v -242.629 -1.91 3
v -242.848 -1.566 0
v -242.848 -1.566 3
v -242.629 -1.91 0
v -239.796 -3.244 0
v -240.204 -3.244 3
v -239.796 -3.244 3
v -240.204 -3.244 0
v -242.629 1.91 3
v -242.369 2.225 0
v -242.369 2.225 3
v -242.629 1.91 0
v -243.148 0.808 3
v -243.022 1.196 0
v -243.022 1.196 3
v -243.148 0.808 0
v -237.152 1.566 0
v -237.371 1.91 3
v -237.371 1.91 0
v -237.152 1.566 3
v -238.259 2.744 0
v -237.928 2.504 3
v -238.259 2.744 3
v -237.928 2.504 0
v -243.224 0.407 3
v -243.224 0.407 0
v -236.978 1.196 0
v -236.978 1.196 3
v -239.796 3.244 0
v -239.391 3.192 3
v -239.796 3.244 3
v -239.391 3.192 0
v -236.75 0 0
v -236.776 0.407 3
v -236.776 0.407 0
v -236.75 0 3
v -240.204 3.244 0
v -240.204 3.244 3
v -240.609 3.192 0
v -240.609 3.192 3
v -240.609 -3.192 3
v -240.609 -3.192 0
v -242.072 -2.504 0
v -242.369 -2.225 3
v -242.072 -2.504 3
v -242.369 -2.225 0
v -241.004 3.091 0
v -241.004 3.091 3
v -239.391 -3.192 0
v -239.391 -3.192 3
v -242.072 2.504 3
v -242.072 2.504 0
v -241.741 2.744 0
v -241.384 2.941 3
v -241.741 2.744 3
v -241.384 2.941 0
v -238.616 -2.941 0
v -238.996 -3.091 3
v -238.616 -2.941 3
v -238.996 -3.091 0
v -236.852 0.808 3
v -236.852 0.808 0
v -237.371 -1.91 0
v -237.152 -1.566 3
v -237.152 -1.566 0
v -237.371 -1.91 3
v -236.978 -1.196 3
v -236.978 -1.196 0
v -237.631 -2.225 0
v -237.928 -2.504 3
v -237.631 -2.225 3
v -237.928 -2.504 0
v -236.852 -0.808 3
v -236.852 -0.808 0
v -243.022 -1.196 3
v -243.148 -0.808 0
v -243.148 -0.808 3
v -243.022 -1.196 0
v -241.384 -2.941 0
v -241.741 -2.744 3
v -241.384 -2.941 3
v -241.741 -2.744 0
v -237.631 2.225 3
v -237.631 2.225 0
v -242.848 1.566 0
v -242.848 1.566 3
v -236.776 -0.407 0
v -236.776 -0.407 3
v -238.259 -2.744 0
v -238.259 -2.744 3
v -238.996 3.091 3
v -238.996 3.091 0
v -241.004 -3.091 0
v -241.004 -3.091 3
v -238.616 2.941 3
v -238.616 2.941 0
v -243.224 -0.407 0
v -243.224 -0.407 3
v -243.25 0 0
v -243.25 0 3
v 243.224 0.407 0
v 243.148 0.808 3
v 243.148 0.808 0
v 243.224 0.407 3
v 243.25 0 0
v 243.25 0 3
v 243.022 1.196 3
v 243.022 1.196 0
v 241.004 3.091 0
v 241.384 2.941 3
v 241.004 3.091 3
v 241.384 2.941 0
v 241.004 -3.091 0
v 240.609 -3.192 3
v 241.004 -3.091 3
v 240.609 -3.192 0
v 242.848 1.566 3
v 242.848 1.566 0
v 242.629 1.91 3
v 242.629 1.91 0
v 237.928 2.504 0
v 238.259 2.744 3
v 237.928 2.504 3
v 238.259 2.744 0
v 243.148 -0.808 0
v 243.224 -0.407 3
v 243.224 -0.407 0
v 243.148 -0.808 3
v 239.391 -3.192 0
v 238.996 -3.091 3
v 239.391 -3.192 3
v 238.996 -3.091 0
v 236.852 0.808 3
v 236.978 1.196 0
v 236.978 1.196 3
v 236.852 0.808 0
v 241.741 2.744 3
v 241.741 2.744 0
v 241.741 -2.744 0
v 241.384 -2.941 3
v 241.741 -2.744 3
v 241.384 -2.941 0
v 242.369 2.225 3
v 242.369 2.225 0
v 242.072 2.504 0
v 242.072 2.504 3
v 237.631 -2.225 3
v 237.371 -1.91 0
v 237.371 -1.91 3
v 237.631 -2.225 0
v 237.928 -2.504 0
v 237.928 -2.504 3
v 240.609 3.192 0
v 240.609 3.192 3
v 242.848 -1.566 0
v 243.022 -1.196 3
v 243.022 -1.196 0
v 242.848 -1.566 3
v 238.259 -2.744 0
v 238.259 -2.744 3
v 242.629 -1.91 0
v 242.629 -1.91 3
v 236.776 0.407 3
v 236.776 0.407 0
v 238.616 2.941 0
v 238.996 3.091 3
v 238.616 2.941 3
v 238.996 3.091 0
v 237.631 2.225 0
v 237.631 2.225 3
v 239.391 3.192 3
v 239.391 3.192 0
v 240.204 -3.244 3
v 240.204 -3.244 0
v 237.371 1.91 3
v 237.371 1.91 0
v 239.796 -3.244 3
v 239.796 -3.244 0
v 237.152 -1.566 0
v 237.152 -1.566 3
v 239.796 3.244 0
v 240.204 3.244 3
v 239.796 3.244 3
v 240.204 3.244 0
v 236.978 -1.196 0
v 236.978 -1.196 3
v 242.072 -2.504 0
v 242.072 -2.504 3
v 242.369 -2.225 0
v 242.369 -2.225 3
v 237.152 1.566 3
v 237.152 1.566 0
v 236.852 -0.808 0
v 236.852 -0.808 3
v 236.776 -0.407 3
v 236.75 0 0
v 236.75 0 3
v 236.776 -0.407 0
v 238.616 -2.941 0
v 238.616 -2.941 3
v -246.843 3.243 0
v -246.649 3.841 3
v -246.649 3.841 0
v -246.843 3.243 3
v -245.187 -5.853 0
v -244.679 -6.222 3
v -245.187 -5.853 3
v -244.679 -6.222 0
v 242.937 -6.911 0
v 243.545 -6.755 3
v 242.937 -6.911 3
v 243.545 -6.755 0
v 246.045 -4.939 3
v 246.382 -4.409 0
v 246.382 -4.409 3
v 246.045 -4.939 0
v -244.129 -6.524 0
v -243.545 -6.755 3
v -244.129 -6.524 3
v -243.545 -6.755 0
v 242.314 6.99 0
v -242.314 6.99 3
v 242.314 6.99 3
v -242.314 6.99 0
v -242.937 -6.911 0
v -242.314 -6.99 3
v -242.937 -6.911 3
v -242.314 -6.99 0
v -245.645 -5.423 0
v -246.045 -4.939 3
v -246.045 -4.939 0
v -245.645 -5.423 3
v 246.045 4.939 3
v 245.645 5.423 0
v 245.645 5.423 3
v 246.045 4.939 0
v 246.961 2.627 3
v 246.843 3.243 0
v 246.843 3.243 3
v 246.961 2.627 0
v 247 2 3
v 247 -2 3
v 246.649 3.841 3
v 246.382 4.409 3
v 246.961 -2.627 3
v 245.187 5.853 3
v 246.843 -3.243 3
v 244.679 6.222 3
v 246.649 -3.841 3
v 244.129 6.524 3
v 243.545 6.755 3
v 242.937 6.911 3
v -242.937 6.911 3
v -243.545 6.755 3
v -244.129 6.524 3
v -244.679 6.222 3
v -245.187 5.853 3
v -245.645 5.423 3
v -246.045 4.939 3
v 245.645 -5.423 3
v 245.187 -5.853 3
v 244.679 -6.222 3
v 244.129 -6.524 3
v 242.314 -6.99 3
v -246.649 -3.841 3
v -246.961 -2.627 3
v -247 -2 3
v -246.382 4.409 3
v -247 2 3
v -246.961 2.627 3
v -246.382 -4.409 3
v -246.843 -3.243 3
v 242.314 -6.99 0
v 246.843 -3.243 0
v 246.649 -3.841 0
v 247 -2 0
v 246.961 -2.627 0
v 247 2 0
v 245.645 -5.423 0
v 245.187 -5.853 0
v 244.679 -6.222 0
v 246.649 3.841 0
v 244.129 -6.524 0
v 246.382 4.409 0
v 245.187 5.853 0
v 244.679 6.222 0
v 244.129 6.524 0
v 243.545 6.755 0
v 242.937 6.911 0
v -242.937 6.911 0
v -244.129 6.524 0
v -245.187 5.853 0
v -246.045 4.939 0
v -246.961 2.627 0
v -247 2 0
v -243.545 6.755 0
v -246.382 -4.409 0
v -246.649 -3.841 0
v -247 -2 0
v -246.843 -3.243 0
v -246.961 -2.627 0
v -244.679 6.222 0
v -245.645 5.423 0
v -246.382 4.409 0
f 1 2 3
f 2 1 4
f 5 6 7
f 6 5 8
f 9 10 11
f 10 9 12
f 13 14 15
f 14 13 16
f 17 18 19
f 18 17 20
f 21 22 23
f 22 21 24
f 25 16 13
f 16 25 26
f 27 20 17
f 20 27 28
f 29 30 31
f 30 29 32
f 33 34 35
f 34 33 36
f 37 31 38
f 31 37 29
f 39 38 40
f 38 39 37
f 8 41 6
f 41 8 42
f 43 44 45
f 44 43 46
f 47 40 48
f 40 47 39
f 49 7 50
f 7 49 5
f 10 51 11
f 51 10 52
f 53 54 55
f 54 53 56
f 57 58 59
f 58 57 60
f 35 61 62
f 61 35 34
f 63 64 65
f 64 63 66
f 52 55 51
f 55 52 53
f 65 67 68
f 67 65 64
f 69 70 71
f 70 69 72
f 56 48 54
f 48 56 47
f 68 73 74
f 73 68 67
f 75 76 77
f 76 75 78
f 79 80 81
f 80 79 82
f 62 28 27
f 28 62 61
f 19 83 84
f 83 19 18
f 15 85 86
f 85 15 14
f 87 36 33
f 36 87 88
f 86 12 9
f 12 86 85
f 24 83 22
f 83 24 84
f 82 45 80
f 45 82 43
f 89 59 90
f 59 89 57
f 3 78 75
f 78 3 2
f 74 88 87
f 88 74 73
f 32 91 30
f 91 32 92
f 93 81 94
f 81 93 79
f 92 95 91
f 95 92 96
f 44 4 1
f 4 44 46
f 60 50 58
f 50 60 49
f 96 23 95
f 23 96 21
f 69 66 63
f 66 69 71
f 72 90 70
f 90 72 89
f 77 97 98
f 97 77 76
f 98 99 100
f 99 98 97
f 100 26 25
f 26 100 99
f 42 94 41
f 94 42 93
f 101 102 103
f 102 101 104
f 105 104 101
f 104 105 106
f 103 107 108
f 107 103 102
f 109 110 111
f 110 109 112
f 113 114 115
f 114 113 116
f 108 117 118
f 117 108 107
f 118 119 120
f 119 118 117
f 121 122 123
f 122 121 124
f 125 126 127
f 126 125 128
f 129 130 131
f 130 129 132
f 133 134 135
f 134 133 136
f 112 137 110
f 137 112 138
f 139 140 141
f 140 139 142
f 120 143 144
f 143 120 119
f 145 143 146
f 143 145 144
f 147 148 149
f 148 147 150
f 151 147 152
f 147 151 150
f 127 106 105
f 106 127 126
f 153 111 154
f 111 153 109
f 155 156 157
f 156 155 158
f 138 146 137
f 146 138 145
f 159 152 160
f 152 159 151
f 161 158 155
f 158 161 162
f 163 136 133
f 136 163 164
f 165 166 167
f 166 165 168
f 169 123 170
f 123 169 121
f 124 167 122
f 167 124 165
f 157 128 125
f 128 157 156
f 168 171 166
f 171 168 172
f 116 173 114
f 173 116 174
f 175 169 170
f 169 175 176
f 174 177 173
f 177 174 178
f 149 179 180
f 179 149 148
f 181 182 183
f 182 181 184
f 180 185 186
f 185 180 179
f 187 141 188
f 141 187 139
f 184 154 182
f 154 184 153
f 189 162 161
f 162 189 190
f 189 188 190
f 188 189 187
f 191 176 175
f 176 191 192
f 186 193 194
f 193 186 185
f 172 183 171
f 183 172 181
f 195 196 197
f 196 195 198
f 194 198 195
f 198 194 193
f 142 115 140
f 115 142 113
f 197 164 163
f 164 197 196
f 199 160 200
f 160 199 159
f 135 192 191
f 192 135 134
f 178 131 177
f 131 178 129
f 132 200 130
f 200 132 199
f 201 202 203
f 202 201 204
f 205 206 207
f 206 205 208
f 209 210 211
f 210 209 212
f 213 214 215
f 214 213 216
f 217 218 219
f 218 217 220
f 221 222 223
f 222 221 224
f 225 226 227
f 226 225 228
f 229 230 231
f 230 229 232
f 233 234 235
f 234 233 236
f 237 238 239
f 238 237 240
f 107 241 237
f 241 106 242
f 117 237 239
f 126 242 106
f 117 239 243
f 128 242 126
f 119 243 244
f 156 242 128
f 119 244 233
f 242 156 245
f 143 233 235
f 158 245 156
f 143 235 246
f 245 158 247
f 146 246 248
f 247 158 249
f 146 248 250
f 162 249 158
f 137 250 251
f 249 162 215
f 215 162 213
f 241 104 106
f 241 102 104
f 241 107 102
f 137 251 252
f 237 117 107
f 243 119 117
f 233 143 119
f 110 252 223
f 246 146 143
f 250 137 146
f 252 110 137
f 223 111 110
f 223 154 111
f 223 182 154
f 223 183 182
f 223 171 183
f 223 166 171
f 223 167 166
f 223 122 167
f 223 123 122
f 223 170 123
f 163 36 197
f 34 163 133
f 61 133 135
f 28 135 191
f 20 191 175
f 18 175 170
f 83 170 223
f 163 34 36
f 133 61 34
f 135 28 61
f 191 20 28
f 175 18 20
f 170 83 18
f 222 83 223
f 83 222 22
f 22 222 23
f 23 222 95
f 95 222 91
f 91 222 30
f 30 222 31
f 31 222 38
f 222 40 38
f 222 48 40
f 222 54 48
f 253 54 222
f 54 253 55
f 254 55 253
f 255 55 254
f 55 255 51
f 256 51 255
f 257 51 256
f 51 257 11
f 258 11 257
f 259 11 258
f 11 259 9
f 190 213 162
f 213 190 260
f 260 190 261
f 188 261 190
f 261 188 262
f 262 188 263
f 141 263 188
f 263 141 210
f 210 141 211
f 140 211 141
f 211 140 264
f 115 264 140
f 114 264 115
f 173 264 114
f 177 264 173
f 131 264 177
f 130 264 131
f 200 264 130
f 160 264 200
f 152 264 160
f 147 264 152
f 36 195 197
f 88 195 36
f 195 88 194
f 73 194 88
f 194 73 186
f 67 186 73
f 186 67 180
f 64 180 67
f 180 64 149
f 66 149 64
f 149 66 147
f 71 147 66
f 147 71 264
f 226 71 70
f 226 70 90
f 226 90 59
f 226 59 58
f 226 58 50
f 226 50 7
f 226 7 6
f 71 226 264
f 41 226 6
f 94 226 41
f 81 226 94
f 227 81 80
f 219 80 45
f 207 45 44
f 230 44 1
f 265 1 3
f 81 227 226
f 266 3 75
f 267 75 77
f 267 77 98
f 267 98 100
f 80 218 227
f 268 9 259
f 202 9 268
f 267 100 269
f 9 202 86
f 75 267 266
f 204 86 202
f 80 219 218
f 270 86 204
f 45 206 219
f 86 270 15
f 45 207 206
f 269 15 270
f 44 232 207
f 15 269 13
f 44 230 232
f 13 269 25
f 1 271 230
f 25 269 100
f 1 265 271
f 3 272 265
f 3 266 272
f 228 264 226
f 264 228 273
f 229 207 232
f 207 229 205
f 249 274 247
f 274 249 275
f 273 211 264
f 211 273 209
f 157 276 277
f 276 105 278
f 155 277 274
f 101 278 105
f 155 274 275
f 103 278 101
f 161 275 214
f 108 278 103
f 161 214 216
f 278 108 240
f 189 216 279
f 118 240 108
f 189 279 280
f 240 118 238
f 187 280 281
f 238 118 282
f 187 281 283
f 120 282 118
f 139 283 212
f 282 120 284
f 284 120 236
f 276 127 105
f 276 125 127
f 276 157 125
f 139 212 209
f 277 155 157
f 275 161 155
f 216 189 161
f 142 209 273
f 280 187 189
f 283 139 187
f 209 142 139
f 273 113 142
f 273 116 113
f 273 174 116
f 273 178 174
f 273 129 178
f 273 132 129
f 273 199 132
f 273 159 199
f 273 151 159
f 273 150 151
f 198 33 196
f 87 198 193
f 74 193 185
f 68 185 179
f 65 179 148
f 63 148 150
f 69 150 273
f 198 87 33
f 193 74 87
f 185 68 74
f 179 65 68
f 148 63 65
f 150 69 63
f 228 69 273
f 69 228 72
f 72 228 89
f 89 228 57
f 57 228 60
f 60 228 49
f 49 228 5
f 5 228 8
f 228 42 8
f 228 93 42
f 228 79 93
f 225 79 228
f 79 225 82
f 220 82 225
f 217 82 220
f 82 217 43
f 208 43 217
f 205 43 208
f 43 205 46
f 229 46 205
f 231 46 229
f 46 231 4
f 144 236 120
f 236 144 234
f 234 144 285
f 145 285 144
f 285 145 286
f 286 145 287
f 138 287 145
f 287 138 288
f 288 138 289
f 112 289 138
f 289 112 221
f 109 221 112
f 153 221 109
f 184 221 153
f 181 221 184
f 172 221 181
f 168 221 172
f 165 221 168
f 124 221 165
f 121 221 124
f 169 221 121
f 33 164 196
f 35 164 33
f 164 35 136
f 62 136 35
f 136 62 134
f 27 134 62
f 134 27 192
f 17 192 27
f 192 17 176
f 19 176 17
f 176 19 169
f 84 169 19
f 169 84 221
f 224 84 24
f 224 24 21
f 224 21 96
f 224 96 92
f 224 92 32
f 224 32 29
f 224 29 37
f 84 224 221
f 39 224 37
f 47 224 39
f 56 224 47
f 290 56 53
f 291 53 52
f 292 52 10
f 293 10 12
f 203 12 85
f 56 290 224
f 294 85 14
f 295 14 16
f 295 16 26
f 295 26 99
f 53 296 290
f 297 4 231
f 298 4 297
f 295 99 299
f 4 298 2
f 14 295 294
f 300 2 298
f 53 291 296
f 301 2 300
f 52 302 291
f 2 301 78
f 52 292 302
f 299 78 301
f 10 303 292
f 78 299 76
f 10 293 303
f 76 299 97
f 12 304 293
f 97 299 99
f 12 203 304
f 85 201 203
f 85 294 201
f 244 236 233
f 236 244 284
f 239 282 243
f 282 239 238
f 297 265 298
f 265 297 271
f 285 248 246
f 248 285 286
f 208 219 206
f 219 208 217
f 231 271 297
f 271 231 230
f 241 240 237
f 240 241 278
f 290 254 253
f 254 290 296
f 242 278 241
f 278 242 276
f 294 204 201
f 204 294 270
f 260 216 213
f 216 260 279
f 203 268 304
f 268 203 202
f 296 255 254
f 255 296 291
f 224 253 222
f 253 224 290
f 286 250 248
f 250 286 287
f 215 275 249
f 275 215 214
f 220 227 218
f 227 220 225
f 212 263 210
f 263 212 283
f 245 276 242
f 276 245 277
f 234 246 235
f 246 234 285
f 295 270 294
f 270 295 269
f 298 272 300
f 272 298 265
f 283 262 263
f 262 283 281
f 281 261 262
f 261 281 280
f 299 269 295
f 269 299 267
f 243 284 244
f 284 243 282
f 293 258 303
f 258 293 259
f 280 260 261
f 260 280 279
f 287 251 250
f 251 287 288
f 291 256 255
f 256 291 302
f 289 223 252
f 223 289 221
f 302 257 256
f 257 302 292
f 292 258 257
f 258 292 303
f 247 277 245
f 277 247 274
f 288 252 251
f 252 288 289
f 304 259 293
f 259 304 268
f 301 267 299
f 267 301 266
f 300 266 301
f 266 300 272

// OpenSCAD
$fn = 50;


difference() {
	union() {
		hull() {
			translate(v = [-242.0000000000, 2.0000000000, 0]) {
				cylinder(h = 3, r = 5);
			}
			translate(v = [242.0000000000, 2.0000000000, 0]) {
				cylinder(h = 3, r = 5);
			}
			translate(v = [-242.0000000000, -2.0000000000, 0]) {
				cylinder(h = 3, r = 5);
			}
			translate(v = [242.0000000000, -2.0000000000, 0]) {
				cylinder(h = 3, r = 5);
			}
		}
	}
	union() {
		translate(v = [-240.0000000000, 0.0000000000, -100.0000000000]) {
			cylinder(h = 200, r = 3.2500000000);
		}
		translate(v = [-240.0000000000, 0.0000000000, -100.0000000000]) {
			cylinder(h = 200, r = 3.2500000000);
		}
		translate(v = [240.0000000000, 0.0000000000, -100.0000000000]) {
			cylinder(h = 200, r = 3.2500000000);
		}
		translate(v = [240.0000000000, 0.0000000000, -100.0000000000]) {
			cylinder(h = 200, r = 3.2500000000);
		}
	}
}
